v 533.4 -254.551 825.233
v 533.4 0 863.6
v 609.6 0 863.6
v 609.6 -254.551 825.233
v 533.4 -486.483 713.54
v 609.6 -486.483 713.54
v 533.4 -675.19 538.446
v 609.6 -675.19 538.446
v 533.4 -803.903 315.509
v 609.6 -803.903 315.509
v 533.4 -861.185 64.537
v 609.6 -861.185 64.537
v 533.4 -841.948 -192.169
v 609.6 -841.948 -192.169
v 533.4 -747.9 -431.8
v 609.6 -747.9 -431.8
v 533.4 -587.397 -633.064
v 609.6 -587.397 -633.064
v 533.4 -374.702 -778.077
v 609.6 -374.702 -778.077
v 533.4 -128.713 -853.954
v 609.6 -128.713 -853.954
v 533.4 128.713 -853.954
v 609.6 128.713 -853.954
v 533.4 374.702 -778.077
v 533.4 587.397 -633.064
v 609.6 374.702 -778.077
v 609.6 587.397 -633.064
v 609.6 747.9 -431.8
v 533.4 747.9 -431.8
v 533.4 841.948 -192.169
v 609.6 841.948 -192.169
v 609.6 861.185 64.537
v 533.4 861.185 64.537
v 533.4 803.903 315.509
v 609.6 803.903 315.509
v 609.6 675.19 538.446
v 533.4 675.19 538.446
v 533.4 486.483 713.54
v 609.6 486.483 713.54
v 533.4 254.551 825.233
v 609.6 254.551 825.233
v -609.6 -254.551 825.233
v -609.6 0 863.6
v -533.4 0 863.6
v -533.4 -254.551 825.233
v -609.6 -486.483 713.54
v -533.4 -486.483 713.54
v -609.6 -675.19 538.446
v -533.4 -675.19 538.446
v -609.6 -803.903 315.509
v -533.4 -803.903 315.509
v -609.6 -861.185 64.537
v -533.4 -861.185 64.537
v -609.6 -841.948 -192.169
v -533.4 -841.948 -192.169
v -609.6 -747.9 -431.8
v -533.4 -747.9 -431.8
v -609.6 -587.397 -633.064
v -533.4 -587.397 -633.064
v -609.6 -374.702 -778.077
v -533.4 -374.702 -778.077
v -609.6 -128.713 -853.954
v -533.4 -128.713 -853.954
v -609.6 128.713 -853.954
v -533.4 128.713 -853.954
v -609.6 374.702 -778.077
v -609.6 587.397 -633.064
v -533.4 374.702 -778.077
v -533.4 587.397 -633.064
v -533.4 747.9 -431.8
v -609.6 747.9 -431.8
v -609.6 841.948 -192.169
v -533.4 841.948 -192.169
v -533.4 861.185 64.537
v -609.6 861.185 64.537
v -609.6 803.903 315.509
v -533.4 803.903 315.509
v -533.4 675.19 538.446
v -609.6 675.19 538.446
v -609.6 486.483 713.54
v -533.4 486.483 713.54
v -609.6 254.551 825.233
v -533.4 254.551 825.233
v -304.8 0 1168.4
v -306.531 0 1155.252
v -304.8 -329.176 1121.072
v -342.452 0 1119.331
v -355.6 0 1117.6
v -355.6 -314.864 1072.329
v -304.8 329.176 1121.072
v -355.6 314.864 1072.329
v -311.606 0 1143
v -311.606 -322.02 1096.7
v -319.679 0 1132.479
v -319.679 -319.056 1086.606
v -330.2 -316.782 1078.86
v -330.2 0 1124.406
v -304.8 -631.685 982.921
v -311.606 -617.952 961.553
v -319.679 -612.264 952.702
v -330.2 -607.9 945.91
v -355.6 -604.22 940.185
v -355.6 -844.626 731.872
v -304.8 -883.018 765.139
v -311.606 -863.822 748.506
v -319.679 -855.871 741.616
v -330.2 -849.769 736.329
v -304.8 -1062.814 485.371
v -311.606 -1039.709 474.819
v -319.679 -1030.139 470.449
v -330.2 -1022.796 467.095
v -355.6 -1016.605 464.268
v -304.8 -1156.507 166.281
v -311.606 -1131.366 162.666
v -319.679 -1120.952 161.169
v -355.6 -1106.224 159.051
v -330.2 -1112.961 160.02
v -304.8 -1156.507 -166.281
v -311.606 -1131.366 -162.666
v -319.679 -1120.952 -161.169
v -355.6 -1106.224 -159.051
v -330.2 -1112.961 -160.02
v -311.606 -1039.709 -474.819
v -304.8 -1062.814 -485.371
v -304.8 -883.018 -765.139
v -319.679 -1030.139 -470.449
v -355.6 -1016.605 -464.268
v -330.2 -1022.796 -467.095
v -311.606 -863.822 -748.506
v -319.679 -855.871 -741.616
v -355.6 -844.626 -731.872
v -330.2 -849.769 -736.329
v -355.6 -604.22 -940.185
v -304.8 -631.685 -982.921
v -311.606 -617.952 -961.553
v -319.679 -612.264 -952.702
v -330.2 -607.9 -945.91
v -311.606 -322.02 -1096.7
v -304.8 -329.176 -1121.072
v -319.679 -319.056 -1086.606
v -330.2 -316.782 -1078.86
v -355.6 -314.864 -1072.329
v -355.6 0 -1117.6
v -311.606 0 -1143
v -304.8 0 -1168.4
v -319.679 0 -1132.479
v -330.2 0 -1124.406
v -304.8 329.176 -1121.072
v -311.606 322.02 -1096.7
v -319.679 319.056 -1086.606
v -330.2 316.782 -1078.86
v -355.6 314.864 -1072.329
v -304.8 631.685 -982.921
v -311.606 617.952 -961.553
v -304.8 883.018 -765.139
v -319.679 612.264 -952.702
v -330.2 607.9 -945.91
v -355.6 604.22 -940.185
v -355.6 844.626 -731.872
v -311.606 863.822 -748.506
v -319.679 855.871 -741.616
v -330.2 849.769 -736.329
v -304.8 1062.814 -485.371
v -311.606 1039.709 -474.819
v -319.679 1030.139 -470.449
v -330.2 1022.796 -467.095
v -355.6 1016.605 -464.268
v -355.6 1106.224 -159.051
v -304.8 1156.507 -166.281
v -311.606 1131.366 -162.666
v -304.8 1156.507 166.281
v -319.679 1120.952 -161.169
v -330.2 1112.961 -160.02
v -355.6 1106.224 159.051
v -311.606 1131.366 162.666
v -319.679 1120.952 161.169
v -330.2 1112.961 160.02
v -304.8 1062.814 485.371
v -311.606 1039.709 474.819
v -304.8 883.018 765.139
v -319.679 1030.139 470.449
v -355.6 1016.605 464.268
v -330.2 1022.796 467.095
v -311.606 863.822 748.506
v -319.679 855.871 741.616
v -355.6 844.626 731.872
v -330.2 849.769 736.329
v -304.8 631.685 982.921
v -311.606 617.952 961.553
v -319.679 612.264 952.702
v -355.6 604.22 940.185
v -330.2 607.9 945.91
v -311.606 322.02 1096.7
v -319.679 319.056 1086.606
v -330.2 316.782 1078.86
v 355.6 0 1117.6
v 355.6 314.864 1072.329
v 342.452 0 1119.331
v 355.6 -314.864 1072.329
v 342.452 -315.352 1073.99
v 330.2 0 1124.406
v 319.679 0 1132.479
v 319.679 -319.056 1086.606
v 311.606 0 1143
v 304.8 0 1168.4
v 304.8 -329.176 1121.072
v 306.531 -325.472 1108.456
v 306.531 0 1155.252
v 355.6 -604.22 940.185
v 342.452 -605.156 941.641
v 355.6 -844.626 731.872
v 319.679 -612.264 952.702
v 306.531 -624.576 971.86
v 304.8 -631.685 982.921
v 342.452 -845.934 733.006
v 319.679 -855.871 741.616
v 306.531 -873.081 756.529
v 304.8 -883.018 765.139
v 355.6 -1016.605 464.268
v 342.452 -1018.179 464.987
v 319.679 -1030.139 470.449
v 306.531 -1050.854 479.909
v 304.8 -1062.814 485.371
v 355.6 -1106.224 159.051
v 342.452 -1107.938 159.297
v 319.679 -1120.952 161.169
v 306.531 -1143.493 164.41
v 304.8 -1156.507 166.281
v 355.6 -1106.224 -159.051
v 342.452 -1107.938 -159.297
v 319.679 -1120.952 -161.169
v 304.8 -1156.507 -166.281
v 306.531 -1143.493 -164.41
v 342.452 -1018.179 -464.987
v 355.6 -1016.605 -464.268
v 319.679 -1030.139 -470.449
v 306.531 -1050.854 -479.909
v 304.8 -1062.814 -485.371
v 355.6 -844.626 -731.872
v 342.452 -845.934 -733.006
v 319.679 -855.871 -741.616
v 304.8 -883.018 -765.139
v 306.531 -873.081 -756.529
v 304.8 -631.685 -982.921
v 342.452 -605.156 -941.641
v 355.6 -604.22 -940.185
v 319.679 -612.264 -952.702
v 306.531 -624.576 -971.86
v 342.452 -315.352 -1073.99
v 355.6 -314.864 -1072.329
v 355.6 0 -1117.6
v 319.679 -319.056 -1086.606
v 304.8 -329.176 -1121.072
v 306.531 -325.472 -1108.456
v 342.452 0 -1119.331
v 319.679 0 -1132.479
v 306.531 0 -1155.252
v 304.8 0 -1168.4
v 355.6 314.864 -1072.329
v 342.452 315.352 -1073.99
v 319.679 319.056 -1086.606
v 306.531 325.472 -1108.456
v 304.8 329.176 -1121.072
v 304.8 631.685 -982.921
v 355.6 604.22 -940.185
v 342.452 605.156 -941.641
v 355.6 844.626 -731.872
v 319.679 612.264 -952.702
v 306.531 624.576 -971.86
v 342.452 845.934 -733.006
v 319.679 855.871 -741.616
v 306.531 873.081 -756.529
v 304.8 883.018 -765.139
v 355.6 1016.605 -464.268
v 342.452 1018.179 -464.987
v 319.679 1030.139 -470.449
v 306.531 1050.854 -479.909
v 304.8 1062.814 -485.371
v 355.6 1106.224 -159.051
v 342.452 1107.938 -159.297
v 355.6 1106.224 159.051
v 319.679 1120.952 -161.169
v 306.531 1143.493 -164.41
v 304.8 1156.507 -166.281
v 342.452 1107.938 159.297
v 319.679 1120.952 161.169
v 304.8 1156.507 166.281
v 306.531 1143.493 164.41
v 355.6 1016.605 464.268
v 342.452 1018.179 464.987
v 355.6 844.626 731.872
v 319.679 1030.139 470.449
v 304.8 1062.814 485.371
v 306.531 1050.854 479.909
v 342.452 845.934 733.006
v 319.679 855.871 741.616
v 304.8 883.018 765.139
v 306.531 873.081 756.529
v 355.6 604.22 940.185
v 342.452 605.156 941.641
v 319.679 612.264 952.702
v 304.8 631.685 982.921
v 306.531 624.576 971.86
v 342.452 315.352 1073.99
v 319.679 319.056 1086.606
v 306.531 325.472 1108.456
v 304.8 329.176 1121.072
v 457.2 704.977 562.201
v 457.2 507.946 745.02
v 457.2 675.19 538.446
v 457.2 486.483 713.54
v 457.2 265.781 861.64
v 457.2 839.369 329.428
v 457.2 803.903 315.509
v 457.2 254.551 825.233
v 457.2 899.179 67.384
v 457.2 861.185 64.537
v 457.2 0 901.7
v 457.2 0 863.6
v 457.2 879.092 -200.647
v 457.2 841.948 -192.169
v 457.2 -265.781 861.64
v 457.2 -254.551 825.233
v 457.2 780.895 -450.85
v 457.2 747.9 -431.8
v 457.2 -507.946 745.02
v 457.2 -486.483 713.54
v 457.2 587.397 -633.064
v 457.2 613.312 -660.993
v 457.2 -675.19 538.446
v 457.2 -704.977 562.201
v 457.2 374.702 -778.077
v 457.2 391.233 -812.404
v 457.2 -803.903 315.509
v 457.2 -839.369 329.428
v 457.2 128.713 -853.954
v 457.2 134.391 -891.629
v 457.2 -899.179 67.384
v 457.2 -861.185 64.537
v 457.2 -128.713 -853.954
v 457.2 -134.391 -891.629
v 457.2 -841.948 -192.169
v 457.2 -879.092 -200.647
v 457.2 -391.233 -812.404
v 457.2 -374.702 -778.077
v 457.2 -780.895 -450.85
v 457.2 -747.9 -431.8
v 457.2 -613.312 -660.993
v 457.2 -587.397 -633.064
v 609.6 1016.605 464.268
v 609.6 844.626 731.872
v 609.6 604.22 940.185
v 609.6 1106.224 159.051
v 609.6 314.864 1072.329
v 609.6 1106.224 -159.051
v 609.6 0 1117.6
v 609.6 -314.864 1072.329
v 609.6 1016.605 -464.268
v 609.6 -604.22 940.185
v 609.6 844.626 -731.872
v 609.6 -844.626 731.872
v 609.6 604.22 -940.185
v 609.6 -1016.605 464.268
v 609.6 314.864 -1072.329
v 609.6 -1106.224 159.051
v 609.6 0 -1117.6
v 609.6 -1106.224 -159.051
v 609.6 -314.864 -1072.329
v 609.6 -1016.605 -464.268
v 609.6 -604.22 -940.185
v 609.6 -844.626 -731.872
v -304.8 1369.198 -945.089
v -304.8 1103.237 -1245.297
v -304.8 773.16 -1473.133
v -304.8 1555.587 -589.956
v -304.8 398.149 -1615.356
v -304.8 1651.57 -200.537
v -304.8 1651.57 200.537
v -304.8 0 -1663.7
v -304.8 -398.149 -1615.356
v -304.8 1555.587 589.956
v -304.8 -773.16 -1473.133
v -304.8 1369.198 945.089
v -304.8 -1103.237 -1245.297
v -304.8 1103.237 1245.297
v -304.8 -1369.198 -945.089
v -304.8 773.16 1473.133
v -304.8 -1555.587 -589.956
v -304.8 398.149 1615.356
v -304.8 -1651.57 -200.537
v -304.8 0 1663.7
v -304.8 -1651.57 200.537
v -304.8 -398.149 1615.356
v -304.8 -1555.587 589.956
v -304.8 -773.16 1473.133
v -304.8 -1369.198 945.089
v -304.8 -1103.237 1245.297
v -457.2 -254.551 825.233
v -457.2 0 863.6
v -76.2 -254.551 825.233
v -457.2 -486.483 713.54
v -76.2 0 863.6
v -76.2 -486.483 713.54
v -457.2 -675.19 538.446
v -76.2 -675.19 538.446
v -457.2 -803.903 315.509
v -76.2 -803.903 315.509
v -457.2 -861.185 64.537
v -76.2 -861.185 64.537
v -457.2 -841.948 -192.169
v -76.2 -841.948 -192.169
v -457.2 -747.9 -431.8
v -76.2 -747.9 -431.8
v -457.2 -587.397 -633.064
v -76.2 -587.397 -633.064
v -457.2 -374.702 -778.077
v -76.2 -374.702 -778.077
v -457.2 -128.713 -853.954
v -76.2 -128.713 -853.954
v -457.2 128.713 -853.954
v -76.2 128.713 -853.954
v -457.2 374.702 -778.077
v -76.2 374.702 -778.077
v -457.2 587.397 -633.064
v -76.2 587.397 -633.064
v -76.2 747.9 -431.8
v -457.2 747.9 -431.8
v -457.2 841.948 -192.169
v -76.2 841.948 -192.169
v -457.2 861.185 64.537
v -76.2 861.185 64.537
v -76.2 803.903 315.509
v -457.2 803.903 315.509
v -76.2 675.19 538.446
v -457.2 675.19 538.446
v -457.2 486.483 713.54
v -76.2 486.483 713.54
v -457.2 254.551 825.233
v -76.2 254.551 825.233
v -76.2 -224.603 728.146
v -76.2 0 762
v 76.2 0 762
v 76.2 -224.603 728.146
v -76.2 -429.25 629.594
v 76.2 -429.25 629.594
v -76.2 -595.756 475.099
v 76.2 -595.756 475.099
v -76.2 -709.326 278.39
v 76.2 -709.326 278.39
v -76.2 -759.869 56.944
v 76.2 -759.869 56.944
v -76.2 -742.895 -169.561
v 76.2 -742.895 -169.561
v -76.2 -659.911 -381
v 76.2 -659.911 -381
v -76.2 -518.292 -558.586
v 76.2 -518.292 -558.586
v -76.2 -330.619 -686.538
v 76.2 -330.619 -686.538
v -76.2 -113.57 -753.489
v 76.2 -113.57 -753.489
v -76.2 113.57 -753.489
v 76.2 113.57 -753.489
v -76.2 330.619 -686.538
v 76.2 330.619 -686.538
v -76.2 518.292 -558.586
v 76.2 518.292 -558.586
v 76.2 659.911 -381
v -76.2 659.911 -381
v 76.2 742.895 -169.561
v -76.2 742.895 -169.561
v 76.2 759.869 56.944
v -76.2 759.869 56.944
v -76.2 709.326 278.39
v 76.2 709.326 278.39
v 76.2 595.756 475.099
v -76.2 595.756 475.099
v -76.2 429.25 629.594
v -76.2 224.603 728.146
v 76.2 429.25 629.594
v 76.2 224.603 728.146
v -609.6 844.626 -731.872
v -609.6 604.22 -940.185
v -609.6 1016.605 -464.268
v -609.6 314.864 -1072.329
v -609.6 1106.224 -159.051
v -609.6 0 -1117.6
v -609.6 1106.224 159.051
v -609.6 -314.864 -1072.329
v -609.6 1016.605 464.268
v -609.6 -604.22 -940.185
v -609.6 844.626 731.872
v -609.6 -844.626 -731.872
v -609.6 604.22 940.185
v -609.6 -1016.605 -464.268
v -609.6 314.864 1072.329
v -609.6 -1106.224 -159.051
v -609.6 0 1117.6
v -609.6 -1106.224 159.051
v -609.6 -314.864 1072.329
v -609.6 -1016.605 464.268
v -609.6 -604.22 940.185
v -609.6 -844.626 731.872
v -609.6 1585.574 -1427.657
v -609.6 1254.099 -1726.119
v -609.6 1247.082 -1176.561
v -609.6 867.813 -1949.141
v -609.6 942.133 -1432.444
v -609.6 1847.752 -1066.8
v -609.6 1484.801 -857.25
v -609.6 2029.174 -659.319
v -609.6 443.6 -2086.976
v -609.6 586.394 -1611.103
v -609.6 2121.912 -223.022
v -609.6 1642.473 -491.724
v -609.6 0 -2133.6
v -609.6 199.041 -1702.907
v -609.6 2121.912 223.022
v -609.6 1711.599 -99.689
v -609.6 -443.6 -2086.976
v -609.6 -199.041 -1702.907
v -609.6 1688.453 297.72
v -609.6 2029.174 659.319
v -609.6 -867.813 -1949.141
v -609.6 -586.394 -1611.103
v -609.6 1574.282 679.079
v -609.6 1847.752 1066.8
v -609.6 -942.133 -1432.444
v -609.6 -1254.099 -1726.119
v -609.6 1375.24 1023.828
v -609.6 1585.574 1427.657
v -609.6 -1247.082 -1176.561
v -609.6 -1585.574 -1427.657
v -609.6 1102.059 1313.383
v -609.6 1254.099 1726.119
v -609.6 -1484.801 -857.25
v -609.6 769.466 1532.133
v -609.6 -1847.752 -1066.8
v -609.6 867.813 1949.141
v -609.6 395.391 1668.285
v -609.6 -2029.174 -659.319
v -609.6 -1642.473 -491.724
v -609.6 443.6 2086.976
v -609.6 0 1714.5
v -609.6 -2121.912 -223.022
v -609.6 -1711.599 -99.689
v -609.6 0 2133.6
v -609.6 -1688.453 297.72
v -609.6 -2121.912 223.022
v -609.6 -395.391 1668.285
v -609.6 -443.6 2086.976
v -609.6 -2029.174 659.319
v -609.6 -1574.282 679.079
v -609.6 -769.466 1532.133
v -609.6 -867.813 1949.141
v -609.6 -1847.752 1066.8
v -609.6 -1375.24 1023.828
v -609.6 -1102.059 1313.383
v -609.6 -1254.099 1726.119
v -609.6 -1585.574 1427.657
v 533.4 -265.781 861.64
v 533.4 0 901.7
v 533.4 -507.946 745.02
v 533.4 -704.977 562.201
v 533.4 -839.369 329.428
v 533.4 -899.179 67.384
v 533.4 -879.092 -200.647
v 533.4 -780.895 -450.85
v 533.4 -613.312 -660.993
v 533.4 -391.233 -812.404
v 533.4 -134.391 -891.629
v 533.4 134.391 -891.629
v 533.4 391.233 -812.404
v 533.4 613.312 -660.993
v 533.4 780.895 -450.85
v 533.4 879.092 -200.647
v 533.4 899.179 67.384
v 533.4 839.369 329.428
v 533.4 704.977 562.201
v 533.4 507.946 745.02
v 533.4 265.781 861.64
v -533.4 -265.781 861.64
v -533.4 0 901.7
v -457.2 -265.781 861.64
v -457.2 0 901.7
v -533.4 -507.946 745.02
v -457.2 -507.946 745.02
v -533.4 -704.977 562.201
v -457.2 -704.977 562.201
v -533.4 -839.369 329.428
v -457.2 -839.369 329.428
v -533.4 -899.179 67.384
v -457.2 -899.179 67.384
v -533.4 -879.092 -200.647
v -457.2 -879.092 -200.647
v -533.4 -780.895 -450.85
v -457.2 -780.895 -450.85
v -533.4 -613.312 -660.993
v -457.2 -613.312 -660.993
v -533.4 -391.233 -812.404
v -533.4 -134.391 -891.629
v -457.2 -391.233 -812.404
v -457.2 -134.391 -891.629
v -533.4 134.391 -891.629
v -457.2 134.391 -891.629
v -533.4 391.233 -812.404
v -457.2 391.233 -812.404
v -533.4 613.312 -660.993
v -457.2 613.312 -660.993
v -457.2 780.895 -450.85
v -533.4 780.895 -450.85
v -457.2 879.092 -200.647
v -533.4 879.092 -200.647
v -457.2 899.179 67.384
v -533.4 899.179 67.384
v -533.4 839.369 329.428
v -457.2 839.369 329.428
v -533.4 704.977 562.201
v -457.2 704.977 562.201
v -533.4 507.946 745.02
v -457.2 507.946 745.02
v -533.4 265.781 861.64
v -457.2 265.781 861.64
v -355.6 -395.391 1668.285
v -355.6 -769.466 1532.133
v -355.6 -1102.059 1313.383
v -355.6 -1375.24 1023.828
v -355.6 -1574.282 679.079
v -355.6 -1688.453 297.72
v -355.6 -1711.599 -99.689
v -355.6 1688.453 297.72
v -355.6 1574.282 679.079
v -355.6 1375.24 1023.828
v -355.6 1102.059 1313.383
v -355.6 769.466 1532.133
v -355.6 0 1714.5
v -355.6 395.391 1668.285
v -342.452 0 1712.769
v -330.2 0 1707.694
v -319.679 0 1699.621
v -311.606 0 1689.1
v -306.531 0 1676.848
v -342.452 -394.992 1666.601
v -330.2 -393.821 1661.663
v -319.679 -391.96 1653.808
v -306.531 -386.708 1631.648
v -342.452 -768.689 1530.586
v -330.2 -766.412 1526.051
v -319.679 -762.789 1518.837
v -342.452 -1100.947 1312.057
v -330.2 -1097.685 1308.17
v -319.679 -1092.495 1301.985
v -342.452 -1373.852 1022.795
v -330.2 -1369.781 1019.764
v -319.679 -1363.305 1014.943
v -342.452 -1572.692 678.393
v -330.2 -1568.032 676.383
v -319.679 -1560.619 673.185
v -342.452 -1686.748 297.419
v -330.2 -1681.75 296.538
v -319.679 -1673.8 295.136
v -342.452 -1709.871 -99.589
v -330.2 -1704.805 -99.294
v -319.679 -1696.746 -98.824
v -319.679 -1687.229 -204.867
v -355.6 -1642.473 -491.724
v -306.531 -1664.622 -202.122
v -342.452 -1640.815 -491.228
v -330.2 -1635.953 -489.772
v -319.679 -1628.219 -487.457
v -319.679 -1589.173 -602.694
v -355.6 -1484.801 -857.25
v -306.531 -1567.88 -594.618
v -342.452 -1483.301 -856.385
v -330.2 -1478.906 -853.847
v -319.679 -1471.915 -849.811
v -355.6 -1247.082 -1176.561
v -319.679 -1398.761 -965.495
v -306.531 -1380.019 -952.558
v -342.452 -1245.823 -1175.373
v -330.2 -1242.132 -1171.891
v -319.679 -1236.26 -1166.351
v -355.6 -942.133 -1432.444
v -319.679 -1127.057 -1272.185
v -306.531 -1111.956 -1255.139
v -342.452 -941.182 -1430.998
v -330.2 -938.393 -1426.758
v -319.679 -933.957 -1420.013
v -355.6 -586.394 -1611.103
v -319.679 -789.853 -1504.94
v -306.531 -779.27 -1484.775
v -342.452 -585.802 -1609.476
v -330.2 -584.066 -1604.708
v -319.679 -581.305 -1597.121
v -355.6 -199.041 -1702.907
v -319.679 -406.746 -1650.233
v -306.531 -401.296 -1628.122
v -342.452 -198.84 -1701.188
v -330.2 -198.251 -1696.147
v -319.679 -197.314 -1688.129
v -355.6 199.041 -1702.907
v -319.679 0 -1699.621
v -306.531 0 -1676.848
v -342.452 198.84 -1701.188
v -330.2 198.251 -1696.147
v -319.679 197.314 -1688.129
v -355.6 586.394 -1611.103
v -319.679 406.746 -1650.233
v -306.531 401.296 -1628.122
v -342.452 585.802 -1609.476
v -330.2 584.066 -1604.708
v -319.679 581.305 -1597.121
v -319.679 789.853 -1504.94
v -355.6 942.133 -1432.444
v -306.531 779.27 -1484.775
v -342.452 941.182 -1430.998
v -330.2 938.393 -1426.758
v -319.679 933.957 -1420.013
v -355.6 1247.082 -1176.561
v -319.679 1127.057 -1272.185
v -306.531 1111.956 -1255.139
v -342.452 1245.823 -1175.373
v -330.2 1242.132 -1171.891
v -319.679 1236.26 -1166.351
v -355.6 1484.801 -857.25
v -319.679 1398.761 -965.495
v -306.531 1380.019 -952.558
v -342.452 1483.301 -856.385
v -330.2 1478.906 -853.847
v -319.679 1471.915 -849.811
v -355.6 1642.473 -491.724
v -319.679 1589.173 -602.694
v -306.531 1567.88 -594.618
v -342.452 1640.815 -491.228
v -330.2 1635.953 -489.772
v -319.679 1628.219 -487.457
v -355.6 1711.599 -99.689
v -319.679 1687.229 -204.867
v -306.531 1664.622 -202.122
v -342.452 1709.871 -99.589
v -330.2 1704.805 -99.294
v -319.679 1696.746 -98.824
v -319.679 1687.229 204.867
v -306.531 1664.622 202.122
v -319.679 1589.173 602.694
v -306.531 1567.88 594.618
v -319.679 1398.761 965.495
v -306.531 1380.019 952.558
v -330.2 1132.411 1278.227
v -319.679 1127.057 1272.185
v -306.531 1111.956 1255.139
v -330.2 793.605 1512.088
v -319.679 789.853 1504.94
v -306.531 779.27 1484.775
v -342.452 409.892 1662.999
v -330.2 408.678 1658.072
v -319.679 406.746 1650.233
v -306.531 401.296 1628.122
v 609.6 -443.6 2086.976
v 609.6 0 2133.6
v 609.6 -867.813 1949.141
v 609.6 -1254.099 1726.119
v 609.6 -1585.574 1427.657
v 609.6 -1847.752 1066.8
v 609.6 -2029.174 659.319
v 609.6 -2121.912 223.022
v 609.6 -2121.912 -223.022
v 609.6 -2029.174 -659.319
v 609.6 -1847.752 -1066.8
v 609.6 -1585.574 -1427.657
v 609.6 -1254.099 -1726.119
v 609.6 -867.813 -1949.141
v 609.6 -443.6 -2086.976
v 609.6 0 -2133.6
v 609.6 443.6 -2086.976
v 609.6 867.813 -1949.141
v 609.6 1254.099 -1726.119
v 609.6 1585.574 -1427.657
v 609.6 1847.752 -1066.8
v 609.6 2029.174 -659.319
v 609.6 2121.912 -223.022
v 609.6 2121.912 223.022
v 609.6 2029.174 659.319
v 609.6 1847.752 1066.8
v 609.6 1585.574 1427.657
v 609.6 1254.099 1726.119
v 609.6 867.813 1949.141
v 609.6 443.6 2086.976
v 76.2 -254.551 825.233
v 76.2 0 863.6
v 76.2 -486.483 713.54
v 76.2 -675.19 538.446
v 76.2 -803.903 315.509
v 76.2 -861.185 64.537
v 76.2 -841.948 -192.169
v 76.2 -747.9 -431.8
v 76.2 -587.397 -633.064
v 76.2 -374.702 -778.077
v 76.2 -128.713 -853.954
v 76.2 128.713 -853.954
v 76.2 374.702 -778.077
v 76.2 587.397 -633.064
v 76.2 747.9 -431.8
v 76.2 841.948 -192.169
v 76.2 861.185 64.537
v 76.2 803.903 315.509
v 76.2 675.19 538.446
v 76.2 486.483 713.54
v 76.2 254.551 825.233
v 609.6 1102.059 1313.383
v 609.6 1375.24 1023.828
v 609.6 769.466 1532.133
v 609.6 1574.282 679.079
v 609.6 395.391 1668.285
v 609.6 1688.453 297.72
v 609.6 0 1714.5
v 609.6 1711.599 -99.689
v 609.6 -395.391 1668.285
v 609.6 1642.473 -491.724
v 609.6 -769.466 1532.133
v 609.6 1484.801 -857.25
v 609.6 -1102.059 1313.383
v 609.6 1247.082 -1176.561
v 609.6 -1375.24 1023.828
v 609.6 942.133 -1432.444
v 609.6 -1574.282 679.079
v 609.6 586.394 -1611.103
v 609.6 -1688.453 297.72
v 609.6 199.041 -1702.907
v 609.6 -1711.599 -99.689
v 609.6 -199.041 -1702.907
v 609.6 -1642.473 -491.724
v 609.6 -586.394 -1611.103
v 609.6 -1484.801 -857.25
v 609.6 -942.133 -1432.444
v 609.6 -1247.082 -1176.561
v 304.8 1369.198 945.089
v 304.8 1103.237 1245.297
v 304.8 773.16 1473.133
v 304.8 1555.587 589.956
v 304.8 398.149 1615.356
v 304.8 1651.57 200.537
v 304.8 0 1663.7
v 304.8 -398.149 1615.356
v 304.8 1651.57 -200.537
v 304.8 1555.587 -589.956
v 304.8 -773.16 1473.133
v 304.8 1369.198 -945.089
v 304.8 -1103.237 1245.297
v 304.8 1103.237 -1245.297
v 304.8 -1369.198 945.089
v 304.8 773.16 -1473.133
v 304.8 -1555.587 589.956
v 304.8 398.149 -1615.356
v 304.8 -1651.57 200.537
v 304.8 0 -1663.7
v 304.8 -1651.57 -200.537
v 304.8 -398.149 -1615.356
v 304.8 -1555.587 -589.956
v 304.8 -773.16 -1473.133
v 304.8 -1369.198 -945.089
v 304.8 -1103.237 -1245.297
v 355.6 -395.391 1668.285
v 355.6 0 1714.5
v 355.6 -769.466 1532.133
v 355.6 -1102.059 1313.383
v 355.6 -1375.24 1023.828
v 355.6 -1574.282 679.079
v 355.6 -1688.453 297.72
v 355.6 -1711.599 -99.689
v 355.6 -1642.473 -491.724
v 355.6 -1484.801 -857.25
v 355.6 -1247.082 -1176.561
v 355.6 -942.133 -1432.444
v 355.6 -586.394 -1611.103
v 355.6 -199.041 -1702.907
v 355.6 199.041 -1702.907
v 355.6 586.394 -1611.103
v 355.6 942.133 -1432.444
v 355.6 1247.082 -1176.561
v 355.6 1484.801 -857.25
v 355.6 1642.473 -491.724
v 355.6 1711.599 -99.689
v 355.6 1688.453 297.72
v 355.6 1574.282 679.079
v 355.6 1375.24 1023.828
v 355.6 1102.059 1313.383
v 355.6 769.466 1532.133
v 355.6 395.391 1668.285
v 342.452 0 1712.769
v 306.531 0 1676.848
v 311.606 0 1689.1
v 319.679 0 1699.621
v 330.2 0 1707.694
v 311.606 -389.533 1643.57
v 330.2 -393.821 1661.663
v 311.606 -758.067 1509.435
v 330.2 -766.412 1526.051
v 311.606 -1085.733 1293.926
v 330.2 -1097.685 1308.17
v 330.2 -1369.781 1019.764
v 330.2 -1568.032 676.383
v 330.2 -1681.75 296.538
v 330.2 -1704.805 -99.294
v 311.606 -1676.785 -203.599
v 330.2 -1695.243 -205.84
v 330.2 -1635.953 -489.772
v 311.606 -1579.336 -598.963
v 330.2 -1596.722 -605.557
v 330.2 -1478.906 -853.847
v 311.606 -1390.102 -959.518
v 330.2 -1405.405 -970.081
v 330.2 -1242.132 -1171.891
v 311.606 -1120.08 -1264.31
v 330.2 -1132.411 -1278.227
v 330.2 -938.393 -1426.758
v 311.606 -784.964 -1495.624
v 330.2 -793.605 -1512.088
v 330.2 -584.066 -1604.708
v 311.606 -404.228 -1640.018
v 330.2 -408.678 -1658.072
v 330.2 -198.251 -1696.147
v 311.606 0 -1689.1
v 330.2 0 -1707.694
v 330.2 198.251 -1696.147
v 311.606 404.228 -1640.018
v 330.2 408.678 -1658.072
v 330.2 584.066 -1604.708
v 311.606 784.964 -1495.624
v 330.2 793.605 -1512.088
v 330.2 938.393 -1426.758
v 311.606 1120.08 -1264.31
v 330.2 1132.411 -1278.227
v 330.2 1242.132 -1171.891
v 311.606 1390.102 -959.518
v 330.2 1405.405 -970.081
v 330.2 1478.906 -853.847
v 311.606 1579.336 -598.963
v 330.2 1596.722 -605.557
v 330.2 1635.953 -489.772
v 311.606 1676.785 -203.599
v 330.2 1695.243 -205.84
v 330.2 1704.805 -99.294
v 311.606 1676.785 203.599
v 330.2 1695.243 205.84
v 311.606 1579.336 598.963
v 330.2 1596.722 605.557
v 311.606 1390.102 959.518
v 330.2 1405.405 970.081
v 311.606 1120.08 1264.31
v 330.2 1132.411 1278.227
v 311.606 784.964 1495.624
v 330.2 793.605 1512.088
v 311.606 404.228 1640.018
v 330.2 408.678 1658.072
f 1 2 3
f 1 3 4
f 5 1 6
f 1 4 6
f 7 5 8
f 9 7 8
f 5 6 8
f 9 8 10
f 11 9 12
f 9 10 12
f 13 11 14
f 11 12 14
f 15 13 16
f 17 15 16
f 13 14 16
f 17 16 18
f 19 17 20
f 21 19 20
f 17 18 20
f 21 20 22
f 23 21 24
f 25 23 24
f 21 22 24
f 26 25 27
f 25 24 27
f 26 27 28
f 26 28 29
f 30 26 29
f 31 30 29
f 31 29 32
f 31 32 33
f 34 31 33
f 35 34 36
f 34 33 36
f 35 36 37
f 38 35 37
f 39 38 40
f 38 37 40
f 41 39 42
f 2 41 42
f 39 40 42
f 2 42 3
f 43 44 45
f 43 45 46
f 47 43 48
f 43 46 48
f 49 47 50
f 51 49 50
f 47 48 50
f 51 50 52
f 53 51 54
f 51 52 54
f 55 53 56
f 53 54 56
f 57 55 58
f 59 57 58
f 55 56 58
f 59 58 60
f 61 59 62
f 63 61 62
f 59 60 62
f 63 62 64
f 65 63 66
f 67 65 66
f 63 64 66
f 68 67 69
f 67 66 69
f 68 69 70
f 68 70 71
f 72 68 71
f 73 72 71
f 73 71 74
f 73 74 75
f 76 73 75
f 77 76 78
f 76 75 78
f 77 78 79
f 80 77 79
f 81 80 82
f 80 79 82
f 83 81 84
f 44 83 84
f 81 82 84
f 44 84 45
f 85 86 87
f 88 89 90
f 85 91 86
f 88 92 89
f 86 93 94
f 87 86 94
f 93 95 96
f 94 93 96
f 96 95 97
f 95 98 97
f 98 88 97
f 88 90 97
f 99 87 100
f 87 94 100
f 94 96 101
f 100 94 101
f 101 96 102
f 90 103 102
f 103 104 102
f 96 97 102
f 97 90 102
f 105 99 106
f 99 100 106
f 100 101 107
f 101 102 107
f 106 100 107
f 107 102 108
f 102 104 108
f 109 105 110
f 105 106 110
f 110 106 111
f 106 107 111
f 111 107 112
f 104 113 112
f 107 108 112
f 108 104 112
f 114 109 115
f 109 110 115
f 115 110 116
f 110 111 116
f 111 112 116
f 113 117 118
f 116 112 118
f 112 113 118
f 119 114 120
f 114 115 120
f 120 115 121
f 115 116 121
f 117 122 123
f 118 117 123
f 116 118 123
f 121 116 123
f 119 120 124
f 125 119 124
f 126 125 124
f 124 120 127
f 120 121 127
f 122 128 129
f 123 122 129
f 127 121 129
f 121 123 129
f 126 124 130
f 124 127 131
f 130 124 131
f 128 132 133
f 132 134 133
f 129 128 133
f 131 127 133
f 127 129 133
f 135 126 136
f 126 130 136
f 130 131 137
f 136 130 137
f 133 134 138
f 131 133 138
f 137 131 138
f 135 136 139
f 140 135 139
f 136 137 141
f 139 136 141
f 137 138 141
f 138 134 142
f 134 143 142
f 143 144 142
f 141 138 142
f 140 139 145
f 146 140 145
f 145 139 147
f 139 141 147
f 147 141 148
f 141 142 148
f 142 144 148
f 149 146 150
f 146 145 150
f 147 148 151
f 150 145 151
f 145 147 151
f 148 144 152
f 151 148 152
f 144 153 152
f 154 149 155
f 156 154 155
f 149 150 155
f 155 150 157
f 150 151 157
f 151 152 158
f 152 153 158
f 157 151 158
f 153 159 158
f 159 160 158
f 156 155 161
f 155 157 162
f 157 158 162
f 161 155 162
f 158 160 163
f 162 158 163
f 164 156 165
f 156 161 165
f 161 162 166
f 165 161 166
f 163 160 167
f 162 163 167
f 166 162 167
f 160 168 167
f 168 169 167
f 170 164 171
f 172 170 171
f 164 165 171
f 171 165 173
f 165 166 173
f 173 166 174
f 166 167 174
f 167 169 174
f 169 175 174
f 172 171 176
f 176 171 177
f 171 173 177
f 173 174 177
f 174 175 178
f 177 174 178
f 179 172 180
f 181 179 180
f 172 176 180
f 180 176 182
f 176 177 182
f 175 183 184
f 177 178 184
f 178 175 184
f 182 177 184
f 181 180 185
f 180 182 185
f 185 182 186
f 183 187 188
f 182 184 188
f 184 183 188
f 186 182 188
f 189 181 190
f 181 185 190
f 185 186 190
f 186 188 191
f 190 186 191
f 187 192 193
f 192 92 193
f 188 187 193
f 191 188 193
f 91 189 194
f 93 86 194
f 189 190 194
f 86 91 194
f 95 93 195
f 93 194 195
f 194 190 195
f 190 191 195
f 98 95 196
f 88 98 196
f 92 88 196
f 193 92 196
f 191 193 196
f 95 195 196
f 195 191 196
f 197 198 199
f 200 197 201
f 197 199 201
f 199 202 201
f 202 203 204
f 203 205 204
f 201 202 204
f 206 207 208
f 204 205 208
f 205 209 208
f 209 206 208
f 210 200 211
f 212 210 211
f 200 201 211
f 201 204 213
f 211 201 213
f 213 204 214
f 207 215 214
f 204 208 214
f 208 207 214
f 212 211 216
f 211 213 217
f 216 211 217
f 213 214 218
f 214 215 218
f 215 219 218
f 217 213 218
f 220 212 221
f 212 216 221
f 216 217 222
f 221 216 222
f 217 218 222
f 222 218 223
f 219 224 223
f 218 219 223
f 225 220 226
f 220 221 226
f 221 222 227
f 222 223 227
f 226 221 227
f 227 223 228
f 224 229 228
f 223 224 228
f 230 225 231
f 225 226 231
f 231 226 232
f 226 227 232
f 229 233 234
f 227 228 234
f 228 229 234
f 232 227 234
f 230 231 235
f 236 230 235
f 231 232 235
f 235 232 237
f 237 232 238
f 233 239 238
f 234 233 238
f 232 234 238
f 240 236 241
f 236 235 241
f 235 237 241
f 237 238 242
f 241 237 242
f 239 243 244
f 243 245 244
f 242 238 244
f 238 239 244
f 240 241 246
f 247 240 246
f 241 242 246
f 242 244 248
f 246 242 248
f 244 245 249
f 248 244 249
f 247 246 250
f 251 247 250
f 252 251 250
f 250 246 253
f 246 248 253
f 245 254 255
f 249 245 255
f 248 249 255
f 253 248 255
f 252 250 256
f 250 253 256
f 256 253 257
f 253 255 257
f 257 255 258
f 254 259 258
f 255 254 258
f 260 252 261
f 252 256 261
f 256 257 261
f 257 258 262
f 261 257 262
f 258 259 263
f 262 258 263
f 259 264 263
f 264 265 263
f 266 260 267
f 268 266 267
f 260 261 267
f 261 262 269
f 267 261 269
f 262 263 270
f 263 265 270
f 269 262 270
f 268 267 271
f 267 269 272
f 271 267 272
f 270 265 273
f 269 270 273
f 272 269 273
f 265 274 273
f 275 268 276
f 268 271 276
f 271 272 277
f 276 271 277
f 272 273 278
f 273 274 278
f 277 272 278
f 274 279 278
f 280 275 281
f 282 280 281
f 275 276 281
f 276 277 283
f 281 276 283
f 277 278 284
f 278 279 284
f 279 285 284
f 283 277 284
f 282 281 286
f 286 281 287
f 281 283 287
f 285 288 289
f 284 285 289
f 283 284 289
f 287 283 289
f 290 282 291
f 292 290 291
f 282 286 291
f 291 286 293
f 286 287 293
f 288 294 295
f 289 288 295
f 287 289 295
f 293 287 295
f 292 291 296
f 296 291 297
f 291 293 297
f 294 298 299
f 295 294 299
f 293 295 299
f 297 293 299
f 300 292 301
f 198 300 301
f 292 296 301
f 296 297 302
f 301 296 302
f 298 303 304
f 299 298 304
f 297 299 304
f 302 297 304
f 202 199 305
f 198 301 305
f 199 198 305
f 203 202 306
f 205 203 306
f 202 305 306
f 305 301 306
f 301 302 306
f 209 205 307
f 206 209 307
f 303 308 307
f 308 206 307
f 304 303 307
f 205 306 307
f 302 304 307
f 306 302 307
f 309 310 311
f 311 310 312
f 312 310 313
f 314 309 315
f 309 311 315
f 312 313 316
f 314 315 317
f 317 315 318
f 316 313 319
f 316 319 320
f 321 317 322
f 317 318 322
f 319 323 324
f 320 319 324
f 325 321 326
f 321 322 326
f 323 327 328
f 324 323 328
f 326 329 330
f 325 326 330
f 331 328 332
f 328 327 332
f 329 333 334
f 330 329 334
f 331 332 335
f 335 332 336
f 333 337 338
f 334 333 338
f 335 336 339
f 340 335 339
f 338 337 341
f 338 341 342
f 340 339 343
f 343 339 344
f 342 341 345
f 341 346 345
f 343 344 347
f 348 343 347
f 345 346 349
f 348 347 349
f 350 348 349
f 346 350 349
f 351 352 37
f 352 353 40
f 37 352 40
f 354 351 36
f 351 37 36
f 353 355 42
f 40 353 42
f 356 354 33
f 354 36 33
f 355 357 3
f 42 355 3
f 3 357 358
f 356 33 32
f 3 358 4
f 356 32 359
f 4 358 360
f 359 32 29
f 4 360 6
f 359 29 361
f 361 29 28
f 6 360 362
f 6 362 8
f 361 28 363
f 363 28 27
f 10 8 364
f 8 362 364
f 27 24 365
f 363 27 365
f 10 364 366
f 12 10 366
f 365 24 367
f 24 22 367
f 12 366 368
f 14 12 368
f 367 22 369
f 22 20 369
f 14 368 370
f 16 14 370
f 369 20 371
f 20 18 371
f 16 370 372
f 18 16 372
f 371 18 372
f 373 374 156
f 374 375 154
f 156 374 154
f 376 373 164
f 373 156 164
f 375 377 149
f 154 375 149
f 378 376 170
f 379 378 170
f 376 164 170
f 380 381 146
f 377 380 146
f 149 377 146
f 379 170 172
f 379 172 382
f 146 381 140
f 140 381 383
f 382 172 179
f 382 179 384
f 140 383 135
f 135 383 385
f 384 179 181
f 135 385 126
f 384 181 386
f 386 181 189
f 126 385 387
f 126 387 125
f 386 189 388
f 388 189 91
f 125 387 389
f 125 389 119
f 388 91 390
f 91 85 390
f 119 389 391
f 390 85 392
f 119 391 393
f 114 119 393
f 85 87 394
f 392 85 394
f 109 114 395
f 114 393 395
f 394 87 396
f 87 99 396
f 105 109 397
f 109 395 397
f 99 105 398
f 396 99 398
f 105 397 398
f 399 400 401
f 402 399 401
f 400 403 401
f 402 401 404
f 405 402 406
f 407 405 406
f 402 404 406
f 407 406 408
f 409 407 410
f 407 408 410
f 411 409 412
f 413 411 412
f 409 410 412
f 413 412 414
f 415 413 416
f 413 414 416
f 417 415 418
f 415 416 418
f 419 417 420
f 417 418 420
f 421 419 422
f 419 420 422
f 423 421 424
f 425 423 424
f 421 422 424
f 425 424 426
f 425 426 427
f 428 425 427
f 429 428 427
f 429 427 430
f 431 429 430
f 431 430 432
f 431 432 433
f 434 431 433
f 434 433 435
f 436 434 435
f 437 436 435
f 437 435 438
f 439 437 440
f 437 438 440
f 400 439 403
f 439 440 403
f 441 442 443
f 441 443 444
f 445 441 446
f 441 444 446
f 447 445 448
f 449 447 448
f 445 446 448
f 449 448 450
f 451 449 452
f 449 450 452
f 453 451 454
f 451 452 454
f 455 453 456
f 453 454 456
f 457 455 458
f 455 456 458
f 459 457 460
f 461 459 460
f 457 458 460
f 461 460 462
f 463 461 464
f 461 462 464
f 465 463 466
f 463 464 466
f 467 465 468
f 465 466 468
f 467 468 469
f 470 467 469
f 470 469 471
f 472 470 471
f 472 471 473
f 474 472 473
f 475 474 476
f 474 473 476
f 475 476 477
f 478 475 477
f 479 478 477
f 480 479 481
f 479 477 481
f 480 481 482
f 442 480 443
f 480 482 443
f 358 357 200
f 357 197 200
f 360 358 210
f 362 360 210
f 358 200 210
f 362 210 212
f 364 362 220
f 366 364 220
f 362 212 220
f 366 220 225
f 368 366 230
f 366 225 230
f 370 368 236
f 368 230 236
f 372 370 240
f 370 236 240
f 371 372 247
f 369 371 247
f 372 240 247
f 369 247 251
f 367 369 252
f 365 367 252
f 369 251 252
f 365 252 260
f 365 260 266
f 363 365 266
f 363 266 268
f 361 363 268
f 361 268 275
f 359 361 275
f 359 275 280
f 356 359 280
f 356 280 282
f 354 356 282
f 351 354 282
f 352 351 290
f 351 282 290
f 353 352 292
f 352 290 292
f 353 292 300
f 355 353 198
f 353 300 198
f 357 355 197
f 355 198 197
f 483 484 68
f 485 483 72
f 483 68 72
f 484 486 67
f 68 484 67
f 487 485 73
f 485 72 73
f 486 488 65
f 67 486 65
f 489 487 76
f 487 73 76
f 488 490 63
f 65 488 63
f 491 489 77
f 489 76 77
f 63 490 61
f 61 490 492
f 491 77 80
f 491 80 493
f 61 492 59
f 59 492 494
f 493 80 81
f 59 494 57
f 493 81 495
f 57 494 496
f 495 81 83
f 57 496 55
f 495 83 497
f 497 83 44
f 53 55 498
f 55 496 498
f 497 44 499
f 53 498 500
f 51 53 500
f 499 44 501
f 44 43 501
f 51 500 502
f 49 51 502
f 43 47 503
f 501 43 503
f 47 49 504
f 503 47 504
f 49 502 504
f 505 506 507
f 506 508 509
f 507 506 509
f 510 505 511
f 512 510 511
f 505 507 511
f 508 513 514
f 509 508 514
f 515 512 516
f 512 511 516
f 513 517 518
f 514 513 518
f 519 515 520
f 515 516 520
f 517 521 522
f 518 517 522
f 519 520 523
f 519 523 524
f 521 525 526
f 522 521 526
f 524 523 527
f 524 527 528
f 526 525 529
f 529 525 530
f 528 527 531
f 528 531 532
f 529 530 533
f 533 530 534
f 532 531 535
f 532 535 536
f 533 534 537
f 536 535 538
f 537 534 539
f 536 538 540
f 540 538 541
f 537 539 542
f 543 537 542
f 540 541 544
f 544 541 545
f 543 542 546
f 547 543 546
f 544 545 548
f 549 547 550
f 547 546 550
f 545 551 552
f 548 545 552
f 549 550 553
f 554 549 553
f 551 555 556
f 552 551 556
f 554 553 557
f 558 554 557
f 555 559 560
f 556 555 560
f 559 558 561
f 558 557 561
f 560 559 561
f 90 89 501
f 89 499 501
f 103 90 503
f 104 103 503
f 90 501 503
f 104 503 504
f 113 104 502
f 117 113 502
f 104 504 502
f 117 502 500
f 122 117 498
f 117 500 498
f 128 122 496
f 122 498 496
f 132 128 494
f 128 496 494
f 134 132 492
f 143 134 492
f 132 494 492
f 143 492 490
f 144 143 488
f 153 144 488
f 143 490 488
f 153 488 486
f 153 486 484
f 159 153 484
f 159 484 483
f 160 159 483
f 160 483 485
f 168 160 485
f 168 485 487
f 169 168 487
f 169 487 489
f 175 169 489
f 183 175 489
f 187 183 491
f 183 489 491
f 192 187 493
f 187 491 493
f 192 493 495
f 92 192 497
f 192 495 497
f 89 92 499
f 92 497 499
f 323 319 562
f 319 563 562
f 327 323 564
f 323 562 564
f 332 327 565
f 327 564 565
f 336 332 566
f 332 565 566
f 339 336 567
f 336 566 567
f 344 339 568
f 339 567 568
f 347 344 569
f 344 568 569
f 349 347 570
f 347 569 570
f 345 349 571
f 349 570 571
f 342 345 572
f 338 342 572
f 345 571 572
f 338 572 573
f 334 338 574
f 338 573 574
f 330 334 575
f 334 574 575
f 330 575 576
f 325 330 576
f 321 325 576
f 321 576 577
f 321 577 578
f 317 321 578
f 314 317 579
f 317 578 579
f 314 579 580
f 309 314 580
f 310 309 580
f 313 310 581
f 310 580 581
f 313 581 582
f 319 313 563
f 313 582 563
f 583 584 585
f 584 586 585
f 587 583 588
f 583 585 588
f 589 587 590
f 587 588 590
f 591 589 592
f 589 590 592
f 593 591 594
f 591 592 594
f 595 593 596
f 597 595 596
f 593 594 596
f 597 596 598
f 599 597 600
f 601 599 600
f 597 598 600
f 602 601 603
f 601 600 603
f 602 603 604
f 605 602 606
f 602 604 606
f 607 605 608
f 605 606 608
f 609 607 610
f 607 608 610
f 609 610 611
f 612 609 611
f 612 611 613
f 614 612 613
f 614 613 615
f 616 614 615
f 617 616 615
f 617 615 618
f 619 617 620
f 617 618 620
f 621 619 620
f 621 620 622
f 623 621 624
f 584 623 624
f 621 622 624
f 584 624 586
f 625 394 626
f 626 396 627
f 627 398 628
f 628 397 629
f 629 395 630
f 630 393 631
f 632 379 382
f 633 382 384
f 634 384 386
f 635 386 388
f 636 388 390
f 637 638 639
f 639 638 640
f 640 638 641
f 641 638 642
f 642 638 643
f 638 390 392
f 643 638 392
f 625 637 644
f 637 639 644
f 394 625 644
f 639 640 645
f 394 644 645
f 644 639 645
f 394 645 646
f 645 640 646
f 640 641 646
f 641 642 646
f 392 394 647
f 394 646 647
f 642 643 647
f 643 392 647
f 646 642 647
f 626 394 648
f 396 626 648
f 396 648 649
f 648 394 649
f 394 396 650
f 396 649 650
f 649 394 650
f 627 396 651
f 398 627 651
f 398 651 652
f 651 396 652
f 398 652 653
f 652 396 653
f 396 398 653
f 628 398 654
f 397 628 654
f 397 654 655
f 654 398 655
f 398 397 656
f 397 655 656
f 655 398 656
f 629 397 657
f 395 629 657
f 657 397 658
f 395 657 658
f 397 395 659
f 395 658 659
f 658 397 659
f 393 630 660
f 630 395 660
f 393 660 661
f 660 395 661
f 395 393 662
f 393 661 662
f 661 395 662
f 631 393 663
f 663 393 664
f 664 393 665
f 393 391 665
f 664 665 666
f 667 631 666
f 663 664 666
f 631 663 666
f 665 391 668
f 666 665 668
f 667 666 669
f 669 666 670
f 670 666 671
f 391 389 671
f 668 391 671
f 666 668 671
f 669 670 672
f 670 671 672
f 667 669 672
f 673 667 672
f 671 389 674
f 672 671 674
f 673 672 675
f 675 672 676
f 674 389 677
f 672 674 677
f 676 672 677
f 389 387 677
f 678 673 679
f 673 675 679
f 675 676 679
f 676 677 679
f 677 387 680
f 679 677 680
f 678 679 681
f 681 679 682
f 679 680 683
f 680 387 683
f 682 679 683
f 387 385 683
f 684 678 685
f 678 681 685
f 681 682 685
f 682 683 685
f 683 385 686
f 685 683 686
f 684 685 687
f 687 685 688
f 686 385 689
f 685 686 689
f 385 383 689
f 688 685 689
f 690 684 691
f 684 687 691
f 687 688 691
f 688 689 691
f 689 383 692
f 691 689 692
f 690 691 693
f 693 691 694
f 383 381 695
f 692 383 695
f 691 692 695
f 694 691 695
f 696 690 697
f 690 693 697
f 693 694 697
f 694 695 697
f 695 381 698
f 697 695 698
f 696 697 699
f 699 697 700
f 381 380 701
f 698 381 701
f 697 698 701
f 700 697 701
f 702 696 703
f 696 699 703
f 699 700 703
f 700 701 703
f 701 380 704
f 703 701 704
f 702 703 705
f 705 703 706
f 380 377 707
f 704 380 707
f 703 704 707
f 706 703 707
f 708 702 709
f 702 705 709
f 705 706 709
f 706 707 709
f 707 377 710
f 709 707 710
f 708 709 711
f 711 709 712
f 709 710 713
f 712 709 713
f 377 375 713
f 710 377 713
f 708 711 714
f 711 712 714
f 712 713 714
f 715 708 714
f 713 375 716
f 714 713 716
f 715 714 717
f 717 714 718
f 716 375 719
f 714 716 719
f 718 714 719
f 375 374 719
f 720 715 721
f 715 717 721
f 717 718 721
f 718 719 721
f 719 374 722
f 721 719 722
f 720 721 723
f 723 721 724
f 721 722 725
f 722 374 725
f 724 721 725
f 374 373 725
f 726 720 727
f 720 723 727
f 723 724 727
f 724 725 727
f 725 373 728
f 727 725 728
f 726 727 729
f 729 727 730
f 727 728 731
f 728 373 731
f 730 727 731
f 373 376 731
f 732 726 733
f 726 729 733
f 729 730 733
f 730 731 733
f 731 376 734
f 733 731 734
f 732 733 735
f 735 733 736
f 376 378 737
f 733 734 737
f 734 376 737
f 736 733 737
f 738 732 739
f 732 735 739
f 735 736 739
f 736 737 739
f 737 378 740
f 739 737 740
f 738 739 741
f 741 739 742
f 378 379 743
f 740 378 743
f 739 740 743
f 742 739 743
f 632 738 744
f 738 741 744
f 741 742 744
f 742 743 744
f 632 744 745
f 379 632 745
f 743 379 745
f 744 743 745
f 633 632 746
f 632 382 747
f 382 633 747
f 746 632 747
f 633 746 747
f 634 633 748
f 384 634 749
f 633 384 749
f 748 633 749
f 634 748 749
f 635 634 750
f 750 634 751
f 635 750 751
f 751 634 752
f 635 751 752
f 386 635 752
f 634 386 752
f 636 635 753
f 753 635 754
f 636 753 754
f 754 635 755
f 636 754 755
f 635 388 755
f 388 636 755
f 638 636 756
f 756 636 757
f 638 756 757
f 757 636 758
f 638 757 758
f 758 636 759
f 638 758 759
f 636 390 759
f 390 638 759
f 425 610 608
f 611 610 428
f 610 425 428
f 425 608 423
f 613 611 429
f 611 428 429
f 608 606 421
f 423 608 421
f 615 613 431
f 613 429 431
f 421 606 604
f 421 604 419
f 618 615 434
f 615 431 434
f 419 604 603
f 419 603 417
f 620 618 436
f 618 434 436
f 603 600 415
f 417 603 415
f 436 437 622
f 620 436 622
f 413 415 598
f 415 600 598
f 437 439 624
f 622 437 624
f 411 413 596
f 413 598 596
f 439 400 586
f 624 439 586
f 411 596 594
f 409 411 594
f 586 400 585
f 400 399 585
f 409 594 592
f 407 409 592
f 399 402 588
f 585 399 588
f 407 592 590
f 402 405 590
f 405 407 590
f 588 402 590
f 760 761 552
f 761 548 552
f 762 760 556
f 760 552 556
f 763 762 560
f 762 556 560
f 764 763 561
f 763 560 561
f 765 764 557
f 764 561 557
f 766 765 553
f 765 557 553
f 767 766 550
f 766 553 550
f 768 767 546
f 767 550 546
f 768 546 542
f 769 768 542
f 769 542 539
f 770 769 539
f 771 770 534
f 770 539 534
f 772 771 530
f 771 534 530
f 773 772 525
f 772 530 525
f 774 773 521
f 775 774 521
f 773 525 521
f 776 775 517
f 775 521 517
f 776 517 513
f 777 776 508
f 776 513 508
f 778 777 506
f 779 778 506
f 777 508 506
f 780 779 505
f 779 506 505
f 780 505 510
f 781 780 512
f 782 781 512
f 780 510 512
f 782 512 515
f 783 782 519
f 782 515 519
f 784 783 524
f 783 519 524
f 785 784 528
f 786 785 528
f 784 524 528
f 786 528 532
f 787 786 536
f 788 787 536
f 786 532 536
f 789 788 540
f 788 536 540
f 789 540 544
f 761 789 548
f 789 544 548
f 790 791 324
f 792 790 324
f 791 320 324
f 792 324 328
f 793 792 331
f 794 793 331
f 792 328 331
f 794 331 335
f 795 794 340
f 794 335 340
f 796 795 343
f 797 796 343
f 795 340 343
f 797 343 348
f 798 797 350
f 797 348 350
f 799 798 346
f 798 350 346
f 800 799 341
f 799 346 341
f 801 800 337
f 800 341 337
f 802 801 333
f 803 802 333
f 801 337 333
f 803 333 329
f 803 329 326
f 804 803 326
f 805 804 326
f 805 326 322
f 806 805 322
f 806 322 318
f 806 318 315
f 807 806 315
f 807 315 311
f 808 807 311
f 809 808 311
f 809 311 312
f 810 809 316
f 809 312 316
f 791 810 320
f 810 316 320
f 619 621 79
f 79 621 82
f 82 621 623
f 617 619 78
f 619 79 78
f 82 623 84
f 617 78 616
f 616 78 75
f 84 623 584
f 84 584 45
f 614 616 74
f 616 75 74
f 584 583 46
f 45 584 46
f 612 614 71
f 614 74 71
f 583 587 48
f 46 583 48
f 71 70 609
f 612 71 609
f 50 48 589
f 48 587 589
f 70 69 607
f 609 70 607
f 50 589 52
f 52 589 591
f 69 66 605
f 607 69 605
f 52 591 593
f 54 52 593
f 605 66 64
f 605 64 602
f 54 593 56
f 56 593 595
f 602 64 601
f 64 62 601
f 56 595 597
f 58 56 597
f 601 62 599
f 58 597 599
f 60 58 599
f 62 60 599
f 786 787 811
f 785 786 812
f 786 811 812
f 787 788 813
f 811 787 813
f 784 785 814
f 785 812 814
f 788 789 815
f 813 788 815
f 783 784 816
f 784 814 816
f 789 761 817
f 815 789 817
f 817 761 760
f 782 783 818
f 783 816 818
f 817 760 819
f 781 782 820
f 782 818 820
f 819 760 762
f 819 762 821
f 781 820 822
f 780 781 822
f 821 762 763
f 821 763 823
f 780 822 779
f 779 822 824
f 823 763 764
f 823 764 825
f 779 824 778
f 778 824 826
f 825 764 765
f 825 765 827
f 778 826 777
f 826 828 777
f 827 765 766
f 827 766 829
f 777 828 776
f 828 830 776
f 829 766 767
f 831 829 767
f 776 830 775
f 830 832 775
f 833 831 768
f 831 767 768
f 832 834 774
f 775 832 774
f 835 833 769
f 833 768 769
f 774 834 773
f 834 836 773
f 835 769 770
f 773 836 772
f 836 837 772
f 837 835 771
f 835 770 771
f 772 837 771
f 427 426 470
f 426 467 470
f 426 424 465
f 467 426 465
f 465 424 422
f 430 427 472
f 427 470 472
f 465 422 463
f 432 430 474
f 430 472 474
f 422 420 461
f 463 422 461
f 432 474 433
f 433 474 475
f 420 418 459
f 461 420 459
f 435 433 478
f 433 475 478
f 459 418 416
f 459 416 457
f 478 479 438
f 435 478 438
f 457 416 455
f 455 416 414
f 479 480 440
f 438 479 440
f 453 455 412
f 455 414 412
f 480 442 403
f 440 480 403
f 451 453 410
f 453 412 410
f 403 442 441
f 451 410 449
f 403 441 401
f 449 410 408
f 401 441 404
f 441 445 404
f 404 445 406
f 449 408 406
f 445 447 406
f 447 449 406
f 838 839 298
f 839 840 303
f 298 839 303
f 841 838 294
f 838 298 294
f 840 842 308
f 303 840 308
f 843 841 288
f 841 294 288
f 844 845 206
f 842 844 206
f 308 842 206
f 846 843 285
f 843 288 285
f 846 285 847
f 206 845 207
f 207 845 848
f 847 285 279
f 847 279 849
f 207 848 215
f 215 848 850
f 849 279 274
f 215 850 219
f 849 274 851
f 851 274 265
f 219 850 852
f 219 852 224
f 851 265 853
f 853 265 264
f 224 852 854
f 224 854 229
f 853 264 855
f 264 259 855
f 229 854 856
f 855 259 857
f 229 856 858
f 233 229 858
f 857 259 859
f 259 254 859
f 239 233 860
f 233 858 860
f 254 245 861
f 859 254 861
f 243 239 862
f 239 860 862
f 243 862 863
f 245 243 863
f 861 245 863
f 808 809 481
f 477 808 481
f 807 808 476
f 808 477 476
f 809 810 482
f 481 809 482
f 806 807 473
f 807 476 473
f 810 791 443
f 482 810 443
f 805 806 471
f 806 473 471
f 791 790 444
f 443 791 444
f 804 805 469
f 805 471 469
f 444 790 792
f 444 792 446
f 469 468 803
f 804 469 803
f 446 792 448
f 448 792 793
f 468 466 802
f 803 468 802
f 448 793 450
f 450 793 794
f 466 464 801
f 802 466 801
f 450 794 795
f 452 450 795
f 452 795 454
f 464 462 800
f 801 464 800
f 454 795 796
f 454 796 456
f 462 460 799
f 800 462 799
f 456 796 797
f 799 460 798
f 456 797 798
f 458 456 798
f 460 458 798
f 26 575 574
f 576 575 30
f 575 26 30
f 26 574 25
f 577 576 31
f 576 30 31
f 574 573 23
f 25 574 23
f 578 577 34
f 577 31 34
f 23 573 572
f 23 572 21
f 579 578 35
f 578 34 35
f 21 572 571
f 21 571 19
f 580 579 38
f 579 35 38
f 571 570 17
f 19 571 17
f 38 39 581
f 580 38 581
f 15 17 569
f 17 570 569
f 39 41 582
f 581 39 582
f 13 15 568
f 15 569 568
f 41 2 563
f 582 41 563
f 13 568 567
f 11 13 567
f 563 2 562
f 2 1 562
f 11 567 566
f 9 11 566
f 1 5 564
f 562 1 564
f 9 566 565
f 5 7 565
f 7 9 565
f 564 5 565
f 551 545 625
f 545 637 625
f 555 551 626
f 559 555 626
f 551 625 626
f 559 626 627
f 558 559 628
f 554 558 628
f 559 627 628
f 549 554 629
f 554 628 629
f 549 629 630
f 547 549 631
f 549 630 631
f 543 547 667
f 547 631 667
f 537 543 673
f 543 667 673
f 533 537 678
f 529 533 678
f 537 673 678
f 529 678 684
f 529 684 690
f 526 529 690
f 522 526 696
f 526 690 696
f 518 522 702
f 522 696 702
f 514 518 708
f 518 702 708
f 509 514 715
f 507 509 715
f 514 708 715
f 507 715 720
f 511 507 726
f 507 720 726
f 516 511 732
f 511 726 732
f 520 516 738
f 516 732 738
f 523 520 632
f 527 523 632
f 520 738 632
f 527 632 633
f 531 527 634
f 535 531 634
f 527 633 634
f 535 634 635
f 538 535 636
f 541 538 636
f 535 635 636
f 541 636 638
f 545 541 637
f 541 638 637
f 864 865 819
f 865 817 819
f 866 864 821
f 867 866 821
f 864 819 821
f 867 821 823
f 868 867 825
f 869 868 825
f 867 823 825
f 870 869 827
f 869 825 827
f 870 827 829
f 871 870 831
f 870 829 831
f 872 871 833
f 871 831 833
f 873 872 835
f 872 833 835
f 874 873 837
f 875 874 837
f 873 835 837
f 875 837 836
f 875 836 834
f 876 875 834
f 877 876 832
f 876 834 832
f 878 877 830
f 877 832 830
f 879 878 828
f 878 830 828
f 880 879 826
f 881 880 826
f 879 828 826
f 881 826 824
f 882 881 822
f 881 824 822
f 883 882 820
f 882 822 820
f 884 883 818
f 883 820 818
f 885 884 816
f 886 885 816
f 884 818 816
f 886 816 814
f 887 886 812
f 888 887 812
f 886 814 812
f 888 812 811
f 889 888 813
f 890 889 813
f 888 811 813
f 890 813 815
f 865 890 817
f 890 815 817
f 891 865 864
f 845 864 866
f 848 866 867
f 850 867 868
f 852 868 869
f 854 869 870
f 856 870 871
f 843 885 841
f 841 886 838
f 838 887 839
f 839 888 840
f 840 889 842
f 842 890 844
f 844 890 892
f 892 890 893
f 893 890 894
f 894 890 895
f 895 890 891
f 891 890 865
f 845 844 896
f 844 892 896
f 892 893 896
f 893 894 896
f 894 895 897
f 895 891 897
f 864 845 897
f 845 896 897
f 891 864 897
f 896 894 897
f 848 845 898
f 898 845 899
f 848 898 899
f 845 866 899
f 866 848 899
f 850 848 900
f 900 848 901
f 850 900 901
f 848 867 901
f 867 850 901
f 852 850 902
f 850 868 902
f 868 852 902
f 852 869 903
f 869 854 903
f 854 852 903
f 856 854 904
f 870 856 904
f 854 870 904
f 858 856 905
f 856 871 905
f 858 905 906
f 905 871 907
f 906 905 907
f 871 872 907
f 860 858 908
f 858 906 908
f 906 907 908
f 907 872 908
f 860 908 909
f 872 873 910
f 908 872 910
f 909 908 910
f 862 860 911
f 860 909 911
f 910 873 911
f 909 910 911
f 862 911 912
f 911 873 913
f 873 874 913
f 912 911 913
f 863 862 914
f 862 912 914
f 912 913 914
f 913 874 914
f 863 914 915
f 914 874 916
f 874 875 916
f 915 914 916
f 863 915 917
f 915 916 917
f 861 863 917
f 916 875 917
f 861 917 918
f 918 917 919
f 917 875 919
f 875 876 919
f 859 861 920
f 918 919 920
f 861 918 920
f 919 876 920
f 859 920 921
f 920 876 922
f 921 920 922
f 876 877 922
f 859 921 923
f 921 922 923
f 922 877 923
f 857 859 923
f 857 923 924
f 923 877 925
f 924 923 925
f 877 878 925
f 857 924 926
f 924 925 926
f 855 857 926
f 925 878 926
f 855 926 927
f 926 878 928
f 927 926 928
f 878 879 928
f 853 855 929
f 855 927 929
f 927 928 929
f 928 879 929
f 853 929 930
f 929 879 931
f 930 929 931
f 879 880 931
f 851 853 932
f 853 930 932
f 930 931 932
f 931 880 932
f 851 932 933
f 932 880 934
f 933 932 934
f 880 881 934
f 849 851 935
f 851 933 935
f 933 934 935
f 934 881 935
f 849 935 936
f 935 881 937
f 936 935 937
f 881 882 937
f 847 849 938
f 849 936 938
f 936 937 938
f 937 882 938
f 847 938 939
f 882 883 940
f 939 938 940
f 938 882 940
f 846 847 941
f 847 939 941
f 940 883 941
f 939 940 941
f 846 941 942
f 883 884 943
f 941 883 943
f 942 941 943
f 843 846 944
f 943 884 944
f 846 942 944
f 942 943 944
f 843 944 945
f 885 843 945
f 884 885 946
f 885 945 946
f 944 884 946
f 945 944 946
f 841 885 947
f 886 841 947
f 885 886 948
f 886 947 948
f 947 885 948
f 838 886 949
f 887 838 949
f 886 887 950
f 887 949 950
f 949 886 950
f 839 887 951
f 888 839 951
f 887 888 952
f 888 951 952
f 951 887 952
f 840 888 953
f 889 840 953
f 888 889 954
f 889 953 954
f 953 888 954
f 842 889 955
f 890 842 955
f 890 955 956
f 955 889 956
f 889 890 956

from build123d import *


with BuildPart() as f1:
    # F0 (on Front) → F1 (revolve)
    with BuildSketch(Plane.XZ):
        with BuildLine():
            Line((609.6, 2133.6), (0, 2133.6))
            Line((0, 2133.6), (-609.6, 2133.6))
            Line((-609.6, 2133.6), (-609.6, 1714.5))
            Line((-609.6, 1714.5), (-355.6, 1714.5))
            ThreePointArc((-355.6, 1714.5), (-319.678976, 1699.621024), (-304.8, 1663.7))
            Line((-304.8, 1663.7), (-304.8, 1168.4))
            ThreePointArc((-304.8, 1168.4), (-319.678976, 1132.478976), (-355.6, 1117.6))
            Line((-355.6, 1117.6), (-609.6, 1117.6))
            Line((-609.6, 1117.6), (-609.6, 863.6))
            Line((-609.6, 863.6), (-533.4, 863.6))
            Line((-533.4, 863.6), (-533.4, 901.7))
            Line((-533.4, 901.7), (-457.2, 901.7))
            Line((-457.2, 901.7), (-457.2, 863.6))
            Line((-457.2, 863.6), (-76.2, 863.6))
            Line((-76.2, 863.6), (-76.2, 762))
            Line((-76.2, 762), (0, 762))
            Line((0, 762), (76.2, 762))
            Line((76.2, 762), (76.2, 863.6))
            Line((76.2, 863.6), (457.2, 863.6))
            Line((457.2, 863.6), (457.2, 901.7))
            Line((457.2, 901.7), (533.4, 901.7))
            Line((533.4, 901.7), (533.4, 863.6))
            Line((533.4, 863.6), (609.6, 863.6))
            Line((609.6, 863.6), (609.6, 1117.6))
            Line((609.6, 1117.6), (355.6, 1117.6))
            ThreePointArc((355.6, 1117.6), (319.678976, 1132.478976), (304.8, 1168.4))
            Line((304.8, 1168.4), (304.8, 1663.7))
            ThreePointArc((304.8, 1663.7), (319.678976, 1699.621024), (355.6, 1714.5))
            Line((355.6, 1714.5), (609.6, 1714.5))
            Line((609.6, 1714.5), (609.6, 2133.6))
        make_face()
    revolve(axis=Axis((-304.8, 0, 0), (1, 0, 0)))


solid = f1.part
